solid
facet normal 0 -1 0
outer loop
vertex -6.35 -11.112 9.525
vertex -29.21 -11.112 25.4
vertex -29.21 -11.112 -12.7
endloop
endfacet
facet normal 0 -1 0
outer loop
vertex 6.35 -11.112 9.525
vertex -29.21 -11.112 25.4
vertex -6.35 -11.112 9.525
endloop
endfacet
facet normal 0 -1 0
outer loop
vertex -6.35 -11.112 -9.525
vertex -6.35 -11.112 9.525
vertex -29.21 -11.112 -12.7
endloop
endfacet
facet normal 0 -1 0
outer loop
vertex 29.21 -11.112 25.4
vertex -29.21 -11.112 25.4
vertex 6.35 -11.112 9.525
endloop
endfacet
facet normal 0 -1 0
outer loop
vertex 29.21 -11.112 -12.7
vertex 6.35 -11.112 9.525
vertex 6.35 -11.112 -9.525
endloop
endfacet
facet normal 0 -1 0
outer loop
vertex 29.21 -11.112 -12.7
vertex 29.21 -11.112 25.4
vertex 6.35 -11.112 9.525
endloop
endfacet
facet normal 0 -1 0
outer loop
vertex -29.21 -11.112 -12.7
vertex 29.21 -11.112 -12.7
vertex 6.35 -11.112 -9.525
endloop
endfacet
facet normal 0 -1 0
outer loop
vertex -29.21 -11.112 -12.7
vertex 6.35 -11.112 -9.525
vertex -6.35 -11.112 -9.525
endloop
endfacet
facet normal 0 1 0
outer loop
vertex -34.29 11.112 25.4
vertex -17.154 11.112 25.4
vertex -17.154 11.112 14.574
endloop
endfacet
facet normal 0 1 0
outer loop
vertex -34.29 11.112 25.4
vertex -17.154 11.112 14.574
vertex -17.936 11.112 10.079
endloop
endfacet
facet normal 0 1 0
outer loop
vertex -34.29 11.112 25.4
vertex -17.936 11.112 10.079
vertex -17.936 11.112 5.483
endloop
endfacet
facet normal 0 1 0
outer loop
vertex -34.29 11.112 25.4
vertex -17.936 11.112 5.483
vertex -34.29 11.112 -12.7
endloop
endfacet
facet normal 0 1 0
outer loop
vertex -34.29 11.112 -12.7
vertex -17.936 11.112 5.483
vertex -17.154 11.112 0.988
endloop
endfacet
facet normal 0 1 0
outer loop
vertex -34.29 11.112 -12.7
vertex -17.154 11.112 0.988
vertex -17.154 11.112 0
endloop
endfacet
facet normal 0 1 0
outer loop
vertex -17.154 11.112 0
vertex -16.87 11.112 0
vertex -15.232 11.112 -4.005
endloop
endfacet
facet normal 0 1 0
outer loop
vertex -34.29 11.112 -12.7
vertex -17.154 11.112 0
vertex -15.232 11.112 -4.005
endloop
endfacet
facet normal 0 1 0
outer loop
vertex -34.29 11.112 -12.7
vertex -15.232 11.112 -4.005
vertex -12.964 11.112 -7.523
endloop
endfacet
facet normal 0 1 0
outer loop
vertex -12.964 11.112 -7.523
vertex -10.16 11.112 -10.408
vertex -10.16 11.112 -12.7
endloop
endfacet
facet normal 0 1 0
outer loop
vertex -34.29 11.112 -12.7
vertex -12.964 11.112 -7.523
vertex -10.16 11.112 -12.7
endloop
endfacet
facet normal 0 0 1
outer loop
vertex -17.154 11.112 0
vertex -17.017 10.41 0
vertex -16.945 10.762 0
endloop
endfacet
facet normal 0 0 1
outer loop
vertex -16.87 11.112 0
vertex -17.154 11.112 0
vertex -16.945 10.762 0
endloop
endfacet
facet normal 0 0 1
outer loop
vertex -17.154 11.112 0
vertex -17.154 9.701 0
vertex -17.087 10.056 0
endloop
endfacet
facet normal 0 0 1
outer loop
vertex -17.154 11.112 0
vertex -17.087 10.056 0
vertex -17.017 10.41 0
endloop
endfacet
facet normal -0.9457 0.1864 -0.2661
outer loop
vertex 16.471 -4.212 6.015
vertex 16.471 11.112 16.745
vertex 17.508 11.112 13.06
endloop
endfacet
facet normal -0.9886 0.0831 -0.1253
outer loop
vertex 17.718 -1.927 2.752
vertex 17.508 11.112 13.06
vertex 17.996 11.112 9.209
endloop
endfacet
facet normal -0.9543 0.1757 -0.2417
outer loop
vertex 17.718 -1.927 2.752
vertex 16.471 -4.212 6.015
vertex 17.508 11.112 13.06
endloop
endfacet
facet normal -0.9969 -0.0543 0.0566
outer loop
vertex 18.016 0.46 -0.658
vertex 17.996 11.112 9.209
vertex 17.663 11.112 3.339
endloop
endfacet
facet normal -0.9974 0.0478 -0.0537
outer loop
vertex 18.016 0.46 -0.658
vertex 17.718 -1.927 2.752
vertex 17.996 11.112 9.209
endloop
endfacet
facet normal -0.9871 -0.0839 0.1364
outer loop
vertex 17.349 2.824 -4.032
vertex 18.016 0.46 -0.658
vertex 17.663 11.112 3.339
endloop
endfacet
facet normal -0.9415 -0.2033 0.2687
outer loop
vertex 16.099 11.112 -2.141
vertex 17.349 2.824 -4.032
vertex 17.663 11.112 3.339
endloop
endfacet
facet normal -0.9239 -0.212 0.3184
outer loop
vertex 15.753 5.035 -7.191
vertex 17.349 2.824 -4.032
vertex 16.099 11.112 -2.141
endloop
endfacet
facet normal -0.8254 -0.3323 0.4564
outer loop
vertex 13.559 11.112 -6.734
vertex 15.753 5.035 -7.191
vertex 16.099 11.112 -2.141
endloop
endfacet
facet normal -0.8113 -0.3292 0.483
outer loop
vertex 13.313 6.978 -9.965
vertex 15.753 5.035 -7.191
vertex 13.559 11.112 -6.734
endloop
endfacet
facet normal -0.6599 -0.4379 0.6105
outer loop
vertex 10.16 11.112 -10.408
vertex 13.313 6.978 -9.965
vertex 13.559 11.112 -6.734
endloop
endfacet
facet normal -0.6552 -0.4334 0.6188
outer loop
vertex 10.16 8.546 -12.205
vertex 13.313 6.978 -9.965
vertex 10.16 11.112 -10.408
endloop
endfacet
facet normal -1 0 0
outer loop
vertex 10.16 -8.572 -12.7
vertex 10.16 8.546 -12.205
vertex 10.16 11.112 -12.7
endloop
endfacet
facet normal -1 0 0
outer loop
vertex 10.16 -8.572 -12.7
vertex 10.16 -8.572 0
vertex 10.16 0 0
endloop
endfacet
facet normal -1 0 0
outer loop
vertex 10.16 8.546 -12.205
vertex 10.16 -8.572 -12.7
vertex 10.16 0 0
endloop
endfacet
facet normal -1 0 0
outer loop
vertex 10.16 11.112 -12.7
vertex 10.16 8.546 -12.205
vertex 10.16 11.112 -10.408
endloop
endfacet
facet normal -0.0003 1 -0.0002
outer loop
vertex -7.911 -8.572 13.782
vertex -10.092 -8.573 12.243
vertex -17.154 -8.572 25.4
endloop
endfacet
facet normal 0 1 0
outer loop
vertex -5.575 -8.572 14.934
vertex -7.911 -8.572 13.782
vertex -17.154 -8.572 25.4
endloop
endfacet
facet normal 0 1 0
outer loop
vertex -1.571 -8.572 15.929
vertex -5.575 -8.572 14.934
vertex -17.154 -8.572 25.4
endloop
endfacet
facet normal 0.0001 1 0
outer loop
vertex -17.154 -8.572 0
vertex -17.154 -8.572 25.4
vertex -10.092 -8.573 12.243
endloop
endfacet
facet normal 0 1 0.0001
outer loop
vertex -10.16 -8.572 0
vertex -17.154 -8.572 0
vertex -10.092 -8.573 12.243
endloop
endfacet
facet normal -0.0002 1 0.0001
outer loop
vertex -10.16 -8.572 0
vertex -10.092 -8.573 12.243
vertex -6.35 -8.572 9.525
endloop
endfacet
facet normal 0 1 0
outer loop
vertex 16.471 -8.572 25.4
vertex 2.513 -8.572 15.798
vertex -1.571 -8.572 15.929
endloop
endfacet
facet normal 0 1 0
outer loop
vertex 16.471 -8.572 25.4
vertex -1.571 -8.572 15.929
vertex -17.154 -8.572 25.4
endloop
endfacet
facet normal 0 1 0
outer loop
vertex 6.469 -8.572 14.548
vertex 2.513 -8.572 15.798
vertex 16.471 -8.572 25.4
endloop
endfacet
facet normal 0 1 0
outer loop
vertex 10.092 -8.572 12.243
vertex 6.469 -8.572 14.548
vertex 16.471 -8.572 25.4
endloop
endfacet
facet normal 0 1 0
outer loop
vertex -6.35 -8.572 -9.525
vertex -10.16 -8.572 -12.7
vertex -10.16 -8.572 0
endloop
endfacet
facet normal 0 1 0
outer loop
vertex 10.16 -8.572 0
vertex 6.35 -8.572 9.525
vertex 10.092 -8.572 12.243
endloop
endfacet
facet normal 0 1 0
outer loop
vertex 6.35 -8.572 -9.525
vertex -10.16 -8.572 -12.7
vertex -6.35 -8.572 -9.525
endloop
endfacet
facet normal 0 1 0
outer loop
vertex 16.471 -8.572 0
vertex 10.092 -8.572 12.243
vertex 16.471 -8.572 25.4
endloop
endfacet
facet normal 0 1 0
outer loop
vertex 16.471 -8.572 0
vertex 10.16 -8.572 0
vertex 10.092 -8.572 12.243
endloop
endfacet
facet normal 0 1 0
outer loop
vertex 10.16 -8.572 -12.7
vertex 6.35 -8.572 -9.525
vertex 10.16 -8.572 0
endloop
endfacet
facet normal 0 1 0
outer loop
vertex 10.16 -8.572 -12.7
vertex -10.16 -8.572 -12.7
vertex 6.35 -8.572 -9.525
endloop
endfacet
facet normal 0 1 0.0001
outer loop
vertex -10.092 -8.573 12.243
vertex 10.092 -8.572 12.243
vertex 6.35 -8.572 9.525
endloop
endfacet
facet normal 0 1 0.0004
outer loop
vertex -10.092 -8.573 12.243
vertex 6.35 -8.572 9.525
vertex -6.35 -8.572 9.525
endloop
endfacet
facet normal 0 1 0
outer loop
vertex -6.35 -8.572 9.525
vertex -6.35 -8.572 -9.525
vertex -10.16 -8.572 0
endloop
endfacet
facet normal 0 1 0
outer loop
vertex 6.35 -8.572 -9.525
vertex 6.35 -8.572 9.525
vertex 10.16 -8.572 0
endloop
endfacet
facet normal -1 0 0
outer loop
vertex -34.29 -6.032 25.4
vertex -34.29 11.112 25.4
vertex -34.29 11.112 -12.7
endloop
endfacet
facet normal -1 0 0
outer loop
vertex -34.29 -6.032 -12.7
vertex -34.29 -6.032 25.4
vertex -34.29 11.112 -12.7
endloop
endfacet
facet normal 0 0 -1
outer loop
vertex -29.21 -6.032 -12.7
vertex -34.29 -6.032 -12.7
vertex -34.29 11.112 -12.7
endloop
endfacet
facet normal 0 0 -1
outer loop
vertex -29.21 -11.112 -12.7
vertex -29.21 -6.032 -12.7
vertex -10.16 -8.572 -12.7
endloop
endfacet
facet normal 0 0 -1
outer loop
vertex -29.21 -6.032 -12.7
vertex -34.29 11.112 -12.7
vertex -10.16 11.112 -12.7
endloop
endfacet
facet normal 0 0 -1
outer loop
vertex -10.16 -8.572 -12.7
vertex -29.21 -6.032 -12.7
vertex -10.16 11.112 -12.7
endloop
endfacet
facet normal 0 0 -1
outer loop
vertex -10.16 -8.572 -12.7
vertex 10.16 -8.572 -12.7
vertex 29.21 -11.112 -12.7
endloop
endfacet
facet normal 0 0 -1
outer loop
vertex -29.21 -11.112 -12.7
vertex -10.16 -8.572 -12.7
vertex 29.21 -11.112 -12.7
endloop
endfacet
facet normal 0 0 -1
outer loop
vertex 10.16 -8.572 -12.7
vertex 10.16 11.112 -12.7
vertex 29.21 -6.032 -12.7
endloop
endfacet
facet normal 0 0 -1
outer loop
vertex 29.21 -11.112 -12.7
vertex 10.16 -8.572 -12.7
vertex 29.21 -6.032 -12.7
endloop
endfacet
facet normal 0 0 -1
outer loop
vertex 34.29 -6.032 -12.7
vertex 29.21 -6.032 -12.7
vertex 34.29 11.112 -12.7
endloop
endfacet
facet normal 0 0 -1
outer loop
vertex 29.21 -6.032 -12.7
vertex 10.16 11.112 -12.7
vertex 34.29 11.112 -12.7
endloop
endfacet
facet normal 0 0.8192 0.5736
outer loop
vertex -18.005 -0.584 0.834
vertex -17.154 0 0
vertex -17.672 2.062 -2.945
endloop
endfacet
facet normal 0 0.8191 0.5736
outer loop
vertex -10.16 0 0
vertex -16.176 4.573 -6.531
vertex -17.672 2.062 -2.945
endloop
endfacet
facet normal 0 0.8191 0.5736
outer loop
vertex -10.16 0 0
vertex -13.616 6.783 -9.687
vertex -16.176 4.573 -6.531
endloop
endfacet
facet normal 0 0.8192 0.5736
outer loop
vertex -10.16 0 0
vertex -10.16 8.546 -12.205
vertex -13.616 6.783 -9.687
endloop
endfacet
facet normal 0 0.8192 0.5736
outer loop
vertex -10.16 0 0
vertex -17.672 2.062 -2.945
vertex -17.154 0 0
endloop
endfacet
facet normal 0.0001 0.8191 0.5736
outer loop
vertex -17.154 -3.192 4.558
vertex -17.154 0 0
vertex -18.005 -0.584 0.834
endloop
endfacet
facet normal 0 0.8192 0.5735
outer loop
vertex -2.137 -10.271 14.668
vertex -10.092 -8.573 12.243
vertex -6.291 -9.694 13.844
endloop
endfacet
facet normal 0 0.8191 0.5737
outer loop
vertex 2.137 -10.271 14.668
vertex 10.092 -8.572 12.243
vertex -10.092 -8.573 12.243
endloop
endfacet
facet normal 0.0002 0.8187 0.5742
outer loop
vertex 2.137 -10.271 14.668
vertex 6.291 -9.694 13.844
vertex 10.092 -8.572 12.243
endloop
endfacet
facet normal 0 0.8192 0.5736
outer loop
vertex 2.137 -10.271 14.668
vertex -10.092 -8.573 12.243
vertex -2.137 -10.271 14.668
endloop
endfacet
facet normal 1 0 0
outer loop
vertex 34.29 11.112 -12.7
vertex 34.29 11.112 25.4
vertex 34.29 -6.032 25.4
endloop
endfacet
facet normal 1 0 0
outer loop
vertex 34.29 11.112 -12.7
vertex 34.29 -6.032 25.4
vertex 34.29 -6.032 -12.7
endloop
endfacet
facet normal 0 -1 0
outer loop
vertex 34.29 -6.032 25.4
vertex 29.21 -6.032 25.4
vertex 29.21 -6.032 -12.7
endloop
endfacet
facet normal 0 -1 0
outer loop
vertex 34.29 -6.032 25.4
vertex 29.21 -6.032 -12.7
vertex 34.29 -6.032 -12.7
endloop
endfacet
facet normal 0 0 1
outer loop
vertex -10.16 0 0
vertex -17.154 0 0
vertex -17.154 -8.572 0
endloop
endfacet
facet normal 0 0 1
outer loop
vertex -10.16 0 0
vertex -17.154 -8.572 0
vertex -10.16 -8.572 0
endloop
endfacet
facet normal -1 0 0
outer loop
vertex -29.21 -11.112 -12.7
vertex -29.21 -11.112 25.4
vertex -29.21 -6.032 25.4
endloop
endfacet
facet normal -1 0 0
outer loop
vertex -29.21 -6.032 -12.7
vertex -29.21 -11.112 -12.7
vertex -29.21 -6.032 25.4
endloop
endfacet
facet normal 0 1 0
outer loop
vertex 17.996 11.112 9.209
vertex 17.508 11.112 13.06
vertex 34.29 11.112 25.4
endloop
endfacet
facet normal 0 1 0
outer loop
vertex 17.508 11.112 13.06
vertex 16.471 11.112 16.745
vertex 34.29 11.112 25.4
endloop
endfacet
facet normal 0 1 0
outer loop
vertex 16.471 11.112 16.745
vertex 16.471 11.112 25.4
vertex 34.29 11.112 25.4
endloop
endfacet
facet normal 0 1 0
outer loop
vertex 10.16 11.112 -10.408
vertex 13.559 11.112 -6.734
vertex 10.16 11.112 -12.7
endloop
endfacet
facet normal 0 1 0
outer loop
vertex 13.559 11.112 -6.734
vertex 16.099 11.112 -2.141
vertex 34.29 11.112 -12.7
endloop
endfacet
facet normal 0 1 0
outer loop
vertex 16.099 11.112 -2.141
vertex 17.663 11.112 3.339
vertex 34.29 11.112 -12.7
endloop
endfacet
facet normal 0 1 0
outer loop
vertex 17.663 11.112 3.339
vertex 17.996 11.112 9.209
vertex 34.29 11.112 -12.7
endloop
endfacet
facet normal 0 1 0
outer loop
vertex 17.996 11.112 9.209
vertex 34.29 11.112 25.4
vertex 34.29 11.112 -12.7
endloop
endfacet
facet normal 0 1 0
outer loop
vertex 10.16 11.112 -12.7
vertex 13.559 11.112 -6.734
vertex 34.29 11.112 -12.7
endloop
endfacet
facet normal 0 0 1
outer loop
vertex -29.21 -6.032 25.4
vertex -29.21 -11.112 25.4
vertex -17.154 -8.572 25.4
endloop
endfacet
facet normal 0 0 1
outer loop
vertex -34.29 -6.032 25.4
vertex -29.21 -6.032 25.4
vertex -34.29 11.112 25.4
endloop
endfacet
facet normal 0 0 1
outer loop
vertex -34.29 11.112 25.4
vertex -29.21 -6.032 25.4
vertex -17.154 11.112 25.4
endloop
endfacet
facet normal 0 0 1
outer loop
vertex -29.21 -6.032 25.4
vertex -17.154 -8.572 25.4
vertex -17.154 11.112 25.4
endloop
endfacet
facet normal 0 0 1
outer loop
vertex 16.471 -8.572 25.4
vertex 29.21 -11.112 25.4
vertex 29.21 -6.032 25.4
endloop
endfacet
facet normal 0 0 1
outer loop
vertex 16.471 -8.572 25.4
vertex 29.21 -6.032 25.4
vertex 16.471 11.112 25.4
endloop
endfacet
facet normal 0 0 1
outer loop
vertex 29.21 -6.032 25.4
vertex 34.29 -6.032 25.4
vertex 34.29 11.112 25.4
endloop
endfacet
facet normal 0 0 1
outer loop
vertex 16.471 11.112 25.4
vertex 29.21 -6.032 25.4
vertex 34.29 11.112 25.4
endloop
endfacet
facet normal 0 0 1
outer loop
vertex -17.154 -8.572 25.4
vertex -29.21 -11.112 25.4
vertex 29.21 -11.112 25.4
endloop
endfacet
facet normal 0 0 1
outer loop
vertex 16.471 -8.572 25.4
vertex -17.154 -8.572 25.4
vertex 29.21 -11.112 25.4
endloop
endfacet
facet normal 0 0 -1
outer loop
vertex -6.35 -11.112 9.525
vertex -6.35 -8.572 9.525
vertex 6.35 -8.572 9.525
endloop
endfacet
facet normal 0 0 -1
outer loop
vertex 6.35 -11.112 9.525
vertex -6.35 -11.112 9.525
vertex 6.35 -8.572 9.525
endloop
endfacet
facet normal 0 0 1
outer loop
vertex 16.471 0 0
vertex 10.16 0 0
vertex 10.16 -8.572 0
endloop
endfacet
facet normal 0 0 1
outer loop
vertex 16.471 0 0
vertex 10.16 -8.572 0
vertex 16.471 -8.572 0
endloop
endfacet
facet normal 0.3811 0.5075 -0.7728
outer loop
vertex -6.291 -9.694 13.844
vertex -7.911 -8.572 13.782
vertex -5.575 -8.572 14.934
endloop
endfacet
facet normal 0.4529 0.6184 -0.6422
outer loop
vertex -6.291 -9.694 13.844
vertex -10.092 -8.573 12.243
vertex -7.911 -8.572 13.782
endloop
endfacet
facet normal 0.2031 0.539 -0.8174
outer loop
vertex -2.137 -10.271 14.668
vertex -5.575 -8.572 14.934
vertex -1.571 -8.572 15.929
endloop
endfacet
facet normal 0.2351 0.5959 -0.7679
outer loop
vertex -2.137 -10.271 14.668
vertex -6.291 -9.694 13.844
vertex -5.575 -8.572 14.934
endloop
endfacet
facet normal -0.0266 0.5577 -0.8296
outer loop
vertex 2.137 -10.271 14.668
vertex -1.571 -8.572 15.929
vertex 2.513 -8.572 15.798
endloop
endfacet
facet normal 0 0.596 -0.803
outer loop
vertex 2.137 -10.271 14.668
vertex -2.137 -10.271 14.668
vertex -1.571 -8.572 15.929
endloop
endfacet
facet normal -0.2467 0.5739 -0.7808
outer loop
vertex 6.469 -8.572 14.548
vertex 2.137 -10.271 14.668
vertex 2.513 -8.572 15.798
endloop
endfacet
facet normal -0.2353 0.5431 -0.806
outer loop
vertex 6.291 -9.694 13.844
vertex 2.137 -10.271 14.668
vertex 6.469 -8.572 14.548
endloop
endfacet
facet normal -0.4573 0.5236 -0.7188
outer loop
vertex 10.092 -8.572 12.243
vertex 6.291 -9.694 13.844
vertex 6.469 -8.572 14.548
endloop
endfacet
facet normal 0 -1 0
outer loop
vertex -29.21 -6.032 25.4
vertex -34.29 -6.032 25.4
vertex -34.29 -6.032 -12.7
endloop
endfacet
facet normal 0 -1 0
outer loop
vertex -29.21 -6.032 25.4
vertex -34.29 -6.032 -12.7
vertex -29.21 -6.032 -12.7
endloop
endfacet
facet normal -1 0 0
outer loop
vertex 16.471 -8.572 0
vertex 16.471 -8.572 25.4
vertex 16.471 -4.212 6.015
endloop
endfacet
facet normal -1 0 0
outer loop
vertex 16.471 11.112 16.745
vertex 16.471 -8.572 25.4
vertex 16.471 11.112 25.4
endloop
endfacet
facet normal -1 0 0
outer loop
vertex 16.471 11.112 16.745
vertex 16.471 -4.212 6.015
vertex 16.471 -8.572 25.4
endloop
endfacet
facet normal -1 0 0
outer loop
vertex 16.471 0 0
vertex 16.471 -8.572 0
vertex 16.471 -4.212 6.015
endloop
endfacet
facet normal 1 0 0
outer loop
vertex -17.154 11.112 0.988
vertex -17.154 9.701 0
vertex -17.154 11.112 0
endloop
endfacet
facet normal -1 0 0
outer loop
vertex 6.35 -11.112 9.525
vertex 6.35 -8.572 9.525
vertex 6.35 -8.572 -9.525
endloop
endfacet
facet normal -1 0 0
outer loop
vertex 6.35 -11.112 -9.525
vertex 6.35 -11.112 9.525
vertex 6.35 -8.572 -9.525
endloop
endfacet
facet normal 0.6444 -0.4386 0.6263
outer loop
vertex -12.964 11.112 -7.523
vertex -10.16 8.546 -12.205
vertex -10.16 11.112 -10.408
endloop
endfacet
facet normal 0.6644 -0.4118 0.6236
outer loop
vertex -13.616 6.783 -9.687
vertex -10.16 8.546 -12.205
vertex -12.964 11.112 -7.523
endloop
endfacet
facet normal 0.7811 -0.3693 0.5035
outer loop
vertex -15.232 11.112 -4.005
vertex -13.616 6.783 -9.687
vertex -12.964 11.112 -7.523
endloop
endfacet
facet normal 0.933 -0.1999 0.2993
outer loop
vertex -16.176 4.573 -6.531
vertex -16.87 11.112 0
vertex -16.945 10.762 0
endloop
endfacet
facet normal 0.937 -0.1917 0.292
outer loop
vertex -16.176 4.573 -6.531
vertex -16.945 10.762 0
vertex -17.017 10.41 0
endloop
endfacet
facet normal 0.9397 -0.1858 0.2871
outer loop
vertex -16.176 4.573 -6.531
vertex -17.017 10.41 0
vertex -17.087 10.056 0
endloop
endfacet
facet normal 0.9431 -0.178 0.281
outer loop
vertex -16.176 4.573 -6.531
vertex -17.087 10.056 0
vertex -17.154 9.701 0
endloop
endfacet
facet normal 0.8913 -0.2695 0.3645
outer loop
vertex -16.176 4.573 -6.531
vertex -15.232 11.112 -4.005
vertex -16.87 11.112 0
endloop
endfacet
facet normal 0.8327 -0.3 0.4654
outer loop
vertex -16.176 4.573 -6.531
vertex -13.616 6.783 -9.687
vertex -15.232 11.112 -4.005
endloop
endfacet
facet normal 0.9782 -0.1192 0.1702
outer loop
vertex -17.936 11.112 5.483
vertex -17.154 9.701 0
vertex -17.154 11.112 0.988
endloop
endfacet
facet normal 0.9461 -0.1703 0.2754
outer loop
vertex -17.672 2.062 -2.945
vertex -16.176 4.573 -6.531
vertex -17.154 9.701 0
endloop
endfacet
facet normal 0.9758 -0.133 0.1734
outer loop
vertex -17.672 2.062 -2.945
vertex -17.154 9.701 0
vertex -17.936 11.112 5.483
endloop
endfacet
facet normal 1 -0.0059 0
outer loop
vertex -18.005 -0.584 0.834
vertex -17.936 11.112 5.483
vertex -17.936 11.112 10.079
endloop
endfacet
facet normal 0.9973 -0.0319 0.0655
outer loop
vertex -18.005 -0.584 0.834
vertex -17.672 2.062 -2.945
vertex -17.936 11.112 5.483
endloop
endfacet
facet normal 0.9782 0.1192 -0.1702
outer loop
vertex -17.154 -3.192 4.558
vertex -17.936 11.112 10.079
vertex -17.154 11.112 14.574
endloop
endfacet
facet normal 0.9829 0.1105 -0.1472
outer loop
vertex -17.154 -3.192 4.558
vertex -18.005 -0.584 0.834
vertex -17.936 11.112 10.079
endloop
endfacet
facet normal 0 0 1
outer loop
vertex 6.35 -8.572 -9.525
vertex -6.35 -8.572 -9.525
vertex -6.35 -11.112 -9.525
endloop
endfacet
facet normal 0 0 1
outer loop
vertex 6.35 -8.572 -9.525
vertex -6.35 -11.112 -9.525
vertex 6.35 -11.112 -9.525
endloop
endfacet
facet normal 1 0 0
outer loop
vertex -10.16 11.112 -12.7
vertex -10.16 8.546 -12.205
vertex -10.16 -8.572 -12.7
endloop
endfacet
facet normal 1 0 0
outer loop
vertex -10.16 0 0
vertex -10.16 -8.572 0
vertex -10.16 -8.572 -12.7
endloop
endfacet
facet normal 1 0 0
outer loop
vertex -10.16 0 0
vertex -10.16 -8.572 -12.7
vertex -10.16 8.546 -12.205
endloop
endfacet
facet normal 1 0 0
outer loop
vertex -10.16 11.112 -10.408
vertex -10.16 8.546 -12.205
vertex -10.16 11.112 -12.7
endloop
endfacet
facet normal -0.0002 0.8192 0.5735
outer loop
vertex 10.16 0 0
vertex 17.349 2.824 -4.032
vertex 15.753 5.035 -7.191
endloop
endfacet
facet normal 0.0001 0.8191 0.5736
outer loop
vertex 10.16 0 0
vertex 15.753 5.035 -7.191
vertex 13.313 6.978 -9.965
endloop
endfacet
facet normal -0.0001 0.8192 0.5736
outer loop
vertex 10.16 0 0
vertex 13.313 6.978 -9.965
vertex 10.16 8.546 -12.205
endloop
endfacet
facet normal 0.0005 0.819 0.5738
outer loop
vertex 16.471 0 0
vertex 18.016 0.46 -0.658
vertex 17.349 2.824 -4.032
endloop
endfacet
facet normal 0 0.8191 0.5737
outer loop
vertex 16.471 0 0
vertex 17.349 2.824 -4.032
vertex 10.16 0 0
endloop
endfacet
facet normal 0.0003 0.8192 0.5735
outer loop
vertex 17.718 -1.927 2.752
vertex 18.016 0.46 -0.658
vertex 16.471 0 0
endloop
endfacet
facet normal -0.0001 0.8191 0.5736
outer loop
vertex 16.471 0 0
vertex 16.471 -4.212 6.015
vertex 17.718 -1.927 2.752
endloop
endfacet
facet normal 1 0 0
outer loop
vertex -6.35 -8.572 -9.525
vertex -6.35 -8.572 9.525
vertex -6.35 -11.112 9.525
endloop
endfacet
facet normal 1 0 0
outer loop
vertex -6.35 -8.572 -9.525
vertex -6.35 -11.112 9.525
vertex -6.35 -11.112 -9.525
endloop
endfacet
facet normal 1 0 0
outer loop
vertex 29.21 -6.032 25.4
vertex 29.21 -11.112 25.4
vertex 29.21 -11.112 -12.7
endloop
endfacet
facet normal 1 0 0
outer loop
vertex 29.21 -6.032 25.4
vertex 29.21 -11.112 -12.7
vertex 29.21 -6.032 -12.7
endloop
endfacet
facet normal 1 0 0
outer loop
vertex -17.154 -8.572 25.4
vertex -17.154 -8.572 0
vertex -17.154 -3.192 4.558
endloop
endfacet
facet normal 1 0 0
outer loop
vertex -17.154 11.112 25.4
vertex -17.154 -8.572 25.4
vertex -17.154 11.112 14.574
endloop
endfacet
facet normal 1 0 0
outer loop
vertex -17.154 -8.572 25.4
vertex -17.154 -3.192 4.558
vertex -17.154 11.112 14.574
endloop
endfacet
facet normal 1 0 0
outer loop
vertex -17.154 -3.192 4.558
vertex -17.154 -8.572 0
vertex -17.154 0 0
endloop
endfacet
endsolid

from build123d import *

# Parameters (mm, degrees)
SKETCH1_W               = 50.8
SKETCH1_H               = 22.225
BOSS_EXTRUDE1_DEPTH     = 34.29
SKETCH2_R               = 18.034
CUT_EXTRUDE1_DEPTH      = 45.095938092
SKETCH3_W               = 20.32
SKETCH3_H               = 19.685
CUT_EXTRUDE2_DEPTH      = 63.289098213
SKETCH4_W               = 12.7
SKETCH4_H               = 19.05
CUT_EXTRUDE3_DEPTH      = 45.095938092
SKETCH7_W               = 68.58
SKETCH7_H               = 12.7
CUT_EXTRUDE5_DEPTH      = 49.113560718
CUT_EXTRUDE6_DEPTH      = 45.095938092
CUT_EXTRUDE6_DEPTH_BACK = 45.095938092
SKETCH9_W               = 5.08
SKETCH9_H               = 5.08
SKETCH6_W               = 33.625329213
SKETCH6_H               = 19.685
CUT_EXTRUDE4_DEPTH      = 45.095938092


with BuildPart() as part:
    # Sketch1 → Boss-Extrude1 (new, symmetric)
    with BuildSketch(Plane(origin=(0, 0, 0), x_dir=(0, 0, -1), z_dir=(1, 0, 0))):
        Rectangle(SKETCH1_W, SKETCH1_H)
    extrude(amount=BOSS_EXTRUDE1_DEPTH, both=True)

    # Sketch2 → Cut-Extrude1 (cut, through all)
    with BuildSketch(Plane(origin=(0, 0, 0), x_dir=(1, 0, 0), z_dir=(0, 0.819152044288991, 0.5735764363510473))):
        Circle(SKETCH2_R)
    extrude(amount=CUT_EXTRUDE1_DEPTH, mode=Mode.SUBTRACT)

    # Sketch3 → Cut-Extrude2 (cut, through all)
    with BuildSketch(Plane.XY.offset(25.4)):
        with Locations((0, 1.27)):
            Rectangle(SKETCH3_W, SKETCH3_H)
    extrude(amount=-CUT_EXTRUDE2_DEPTH, mode=Mode.SUBTRACT)

    # Sketch4 → Cut-Extrude3 (cut, through all)
    with BuildSketch(Plane(origin=(0, 0, 0), x_dir=(1, 0, 0), z_dir=(0, 1, 0))):
        Rectangle(SKETCH4_W, SKETCH4_H)
    extrude(amount=-CUT_EXTRUDE3_DEPTH, mode=Mode.SUBTRACT)

    # Sketch7 → Cut-Extrude5 (cut, through all)
    with BuildSketch(Plane(origin=(0, 11.1125, 0), x_dir=(1, 0, 0), z_dir=(0, 1, 0))):
        with Locations((0, 19.05)):
            Rectangle(SKETCH7_W, SKETCH7_H)
    extrude(amount=-CUT_EXTRUDE5_DEPTH, mode=Mode.SUBTRACT)

    # Sketch9 → Cut-Extrude6 (cut, two sides: drawn at the far end of the back side and taken through both)
    with BuildSketch(Plane.XY.offset(-CUT_EXTRUDE6_DEPTH_BACK)):
        with Locations((-31.75, -8.5725)):
            Rectangle(SKETCH9_W, SKETCH9_H)
        with Locations((31.75, -8.5725)):
            Rectangle(SKETCH9_W, SKETCH9_H)
    extrude(amount=CUT_EXTRUDE6_DEPTH + CUT_EXTRUDE6_DEPTH_BACK, mode=Mode.SUBTRACT)

    # Sketch6 → Cut-Extrude4 (cut, through all)
    with BuildSketch(Plane.XY):
        with Locations((-0.341373901, 1.27)):
            Rectangle(SKETCH6_W, SKETCH6_H)
    extrude(amount=CUT_EXTRUDE4_DEPTH, mode=Mode.SUBTRACT)


solid = part.part
